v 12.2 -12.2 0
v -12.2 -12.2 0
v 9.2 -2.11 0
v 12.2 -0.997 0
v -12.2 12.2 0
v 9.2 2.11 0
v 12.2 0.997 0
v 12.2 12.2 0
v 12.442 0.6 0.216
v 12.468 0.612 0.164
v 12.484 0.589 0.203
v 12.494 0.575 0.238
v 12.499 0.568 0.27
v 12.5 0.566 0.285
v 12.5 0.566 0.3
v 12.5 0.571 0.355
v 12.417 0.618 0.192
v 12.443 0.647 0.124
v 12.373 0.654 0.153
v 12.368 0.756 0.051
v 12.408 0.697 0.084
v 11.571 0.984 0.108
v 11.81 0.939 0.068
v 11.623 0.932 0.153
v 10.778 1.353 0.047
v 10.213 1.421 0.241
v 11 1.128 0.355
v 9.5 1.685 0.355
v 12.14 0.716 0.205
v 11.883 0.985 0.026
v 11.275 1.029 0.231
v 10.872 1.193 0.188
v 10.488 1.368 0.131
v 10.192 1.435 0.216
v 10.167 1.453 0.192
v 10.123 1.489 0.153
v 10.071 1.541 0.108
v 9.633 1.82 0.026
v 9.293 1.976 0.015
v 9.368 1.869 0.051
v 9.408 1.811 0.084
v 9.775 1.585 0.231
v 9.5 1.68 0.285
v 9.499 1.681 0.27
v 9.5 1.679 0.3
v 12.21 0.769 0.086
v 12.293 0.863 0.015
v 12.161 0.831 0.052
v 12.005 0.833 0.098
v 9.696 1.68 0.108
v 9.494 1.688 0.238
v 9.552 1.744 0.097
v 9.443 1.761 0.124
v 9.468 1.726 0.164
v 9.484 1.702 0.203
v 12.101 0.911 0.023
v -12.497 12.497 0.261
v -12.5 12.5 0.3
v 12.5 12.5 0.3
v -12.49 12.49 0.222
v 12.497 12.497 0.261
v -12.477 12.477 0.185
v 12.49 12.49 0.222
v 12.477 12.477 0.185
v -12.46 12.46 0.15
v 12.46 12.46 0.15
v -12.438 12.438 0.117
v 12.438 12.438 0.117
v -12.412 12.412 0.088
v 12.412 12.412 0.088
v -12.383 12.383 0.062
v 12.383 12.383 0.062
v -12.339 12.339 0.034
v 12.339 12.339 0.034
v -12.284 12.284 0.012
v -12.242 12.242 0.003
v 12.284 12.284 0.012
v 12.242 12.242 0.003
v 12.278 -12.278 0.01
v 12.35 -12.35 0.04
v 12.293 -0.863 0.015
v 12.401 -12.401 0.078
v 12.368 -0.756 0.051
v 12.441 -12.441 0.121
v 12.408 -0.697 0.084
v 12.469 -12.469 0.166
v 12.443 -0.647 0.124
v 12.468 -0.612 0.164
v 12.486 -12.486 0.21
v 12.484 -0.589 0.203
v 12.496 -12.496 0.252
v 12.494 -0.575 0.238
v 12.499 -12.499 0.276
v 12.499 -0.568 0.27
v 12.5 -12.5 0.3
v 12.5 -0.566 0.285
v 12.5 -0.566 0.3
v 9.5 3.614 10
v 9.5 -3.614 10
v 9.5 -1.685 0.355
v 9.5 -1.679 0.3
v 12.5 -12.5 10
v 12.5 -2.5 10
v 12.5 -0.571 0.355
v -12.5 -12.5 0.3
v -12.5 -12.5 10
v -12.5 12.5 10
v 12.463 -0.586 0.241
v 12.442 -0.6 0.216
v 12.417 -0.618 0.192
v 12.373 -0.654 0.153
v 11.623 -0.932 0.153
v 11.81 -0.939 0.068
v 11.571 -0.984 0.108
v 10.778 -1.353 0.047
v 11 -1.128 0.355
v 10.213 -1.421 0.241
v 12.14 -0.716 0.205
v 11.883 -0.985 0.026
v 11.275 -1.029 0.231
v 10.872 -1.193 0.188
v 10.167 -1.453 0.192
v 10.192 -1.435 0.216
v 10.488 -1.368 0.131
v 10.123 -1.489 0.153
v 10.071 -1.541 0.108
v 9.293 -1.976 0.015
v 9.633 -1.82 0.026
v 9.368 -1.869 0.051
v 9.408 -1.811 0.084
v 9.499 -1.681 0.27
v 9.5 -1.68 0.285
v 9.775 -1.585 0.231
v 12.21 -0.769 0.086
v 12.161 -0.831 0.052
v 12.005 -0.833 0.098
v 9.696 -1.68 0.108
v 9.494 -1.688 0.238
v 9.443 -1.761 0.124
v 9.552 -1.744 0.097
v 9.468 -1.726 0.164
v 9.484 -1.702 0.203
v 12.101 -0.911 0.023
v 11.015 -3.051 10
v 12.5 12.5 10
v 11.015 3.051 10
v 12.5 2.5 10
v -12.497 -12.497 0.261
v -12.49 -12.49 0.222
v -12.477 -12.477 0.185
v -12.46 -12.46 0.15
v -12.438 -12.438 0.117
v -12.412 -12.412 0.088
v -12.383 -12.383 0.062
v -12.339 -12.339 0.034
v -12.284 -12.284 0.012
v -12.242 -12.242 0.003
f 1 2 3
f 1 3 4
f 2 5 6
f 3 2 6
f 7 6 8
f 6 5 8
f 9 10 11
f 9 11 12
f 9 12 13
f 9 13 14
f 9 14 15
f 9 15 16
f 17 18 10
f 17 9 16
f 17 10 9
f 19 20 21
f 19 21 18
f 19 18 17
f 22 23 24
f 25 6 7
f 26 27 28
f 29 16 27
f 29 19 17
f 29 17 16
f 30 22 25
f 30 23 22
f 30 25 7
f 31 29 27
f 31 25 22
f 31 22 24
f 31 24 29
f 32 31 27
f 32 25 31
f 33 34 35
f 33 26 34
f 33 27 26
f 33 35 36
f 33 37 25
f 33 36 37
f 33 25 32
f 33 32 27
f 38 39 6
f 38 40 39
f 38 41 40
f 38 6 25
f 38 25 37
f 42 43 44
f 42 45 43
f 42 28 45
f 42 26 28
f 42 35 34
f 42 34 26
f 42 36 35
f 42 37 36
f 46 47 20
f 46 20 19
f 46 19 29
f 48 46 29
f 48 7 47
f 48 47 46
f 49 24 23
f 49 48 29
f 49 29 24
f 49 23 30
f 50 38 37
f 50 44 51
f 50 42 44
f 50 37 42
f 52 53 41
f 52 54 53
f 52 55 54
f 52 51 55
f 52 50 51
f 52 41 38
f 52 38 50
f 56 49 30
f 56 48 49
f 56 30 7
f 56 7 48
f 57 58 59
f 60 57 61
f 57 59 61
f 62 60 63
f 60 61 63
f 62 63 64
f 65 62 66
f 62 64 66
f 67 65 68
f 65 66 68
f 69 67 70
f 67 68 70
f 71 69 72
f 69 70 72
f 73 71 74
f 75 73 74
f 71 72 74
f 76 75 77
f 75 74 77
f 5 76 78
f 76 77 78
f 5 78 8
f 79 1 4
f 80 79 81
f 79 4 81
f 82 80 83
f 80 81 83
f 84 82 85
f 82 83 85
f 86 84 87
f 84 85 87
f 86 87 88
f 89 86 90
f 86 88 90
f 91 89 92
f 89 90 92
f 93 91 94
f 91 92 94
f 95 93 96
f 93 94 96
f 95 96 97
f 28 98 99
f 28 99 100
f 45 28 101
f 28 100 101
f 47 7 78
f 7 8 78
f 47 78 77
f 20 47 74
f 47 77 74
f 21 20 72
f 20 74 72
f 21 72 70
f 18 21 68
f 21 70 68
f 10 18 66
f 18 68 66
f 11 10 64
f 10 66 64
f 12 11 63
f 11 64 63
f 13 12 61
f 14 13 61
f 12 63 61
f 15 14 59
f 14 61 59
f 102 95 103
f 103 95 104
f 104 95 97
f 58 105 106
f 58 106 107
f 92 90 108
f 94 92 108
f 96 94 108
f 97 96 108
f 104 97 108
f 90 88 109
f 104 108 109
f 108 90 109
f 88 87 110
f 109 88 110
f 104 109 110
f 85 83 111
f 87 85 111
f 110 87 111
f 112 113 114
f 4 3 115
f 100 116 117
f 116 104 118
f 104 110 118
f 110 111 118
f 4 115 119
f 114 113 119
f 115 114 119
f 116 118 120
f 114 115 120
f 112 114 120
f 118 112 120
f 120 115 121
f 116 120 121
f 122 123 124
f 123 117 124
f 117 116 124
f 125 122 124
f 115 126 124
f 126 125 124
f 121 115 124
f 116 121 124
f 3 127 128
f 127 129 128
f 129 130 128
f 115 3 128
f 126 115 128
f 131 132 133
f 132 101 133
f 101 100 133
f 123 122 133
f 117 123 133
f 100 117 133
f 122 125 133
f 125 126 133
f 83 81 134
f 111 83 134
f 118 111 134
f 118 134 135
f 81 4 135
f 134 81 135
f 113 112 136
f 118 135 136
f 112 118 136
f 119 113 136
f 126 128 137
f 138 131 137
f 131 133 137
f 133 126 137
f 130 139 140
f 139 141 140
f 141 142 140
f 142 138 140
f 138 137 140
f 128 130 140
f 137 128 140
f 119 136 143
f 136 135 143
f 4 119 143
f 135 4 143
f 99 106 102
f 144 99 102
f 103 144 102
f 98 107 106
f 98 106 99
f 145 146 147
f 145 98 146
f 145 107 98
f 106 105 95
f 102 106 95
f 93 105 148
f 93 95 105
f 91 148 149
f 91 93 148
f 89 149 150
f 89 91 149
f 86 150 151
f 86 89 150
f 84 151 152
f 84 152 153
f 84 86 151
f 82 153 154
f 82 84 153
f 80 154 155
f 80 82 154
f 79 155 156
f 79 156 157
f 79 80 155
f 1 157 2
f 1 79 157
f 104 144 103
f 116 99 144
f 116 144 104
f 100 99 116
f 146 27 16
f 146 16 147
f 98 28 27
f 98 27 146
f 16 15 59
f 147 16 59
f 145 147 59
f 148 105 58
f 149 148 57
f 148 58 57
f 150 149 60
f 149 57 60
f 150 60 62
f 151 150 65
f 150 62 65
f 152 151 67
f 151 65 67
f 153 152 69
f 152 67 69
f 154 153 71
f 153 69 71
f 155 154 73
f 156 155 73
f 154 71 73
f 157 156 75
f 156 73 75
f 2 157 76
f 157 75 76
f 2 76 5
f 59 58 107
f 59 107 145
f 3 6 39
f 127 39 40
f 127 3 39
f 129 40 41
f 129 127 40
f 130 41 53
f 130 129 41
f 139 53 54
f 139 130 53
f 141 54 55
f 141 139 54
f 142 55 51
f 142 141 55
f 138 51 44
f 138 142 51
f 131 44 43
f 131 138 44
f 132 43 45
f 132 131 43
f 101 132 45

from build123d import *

# Parameters (mm, degrees)
F0_W     = 25
F0_H     = 25
F1_DEPTH = 10
F3_DEPTH = 3
F3_TAPER = -20
F4_R     = 0.3


with BuildPart() as f1:
    # F0 (on Top) → F1 (new body)
    with BuildSketch(Plane.XY):
        Rectangle(F0_W, F0_H)
    extrude(amount=F1_DEPTH)

    # F2 (on face) → F3 (cut)
    with BuildSketch(Plane.YZ.offset(12.5)):
        Polygon((2.5, 10), (-2.5, 10), (-0.5, 0), (0.5, 0), align=None)
    extrude(amount=-F3_DEPTH, taper=F3_TAPER, mode=Mode.SUBTRACT)

    # F4
    f4_edges = [f1.edges().sort_by_distance(p)[0] for p in [
        (-12.5, 0, 0),
        (0, 12.5, 0),
        (12.5, 6.5, 0),
        (11, 1.056767, 0),
        (9.5, 0, 0),
        (11, -1.056767, 0),
        (12.5, -6.5, 0),
        (0, -12.5, 0),
    ]]
    fillet(f4_edges, radius=F4_R)


solid = f1.part
